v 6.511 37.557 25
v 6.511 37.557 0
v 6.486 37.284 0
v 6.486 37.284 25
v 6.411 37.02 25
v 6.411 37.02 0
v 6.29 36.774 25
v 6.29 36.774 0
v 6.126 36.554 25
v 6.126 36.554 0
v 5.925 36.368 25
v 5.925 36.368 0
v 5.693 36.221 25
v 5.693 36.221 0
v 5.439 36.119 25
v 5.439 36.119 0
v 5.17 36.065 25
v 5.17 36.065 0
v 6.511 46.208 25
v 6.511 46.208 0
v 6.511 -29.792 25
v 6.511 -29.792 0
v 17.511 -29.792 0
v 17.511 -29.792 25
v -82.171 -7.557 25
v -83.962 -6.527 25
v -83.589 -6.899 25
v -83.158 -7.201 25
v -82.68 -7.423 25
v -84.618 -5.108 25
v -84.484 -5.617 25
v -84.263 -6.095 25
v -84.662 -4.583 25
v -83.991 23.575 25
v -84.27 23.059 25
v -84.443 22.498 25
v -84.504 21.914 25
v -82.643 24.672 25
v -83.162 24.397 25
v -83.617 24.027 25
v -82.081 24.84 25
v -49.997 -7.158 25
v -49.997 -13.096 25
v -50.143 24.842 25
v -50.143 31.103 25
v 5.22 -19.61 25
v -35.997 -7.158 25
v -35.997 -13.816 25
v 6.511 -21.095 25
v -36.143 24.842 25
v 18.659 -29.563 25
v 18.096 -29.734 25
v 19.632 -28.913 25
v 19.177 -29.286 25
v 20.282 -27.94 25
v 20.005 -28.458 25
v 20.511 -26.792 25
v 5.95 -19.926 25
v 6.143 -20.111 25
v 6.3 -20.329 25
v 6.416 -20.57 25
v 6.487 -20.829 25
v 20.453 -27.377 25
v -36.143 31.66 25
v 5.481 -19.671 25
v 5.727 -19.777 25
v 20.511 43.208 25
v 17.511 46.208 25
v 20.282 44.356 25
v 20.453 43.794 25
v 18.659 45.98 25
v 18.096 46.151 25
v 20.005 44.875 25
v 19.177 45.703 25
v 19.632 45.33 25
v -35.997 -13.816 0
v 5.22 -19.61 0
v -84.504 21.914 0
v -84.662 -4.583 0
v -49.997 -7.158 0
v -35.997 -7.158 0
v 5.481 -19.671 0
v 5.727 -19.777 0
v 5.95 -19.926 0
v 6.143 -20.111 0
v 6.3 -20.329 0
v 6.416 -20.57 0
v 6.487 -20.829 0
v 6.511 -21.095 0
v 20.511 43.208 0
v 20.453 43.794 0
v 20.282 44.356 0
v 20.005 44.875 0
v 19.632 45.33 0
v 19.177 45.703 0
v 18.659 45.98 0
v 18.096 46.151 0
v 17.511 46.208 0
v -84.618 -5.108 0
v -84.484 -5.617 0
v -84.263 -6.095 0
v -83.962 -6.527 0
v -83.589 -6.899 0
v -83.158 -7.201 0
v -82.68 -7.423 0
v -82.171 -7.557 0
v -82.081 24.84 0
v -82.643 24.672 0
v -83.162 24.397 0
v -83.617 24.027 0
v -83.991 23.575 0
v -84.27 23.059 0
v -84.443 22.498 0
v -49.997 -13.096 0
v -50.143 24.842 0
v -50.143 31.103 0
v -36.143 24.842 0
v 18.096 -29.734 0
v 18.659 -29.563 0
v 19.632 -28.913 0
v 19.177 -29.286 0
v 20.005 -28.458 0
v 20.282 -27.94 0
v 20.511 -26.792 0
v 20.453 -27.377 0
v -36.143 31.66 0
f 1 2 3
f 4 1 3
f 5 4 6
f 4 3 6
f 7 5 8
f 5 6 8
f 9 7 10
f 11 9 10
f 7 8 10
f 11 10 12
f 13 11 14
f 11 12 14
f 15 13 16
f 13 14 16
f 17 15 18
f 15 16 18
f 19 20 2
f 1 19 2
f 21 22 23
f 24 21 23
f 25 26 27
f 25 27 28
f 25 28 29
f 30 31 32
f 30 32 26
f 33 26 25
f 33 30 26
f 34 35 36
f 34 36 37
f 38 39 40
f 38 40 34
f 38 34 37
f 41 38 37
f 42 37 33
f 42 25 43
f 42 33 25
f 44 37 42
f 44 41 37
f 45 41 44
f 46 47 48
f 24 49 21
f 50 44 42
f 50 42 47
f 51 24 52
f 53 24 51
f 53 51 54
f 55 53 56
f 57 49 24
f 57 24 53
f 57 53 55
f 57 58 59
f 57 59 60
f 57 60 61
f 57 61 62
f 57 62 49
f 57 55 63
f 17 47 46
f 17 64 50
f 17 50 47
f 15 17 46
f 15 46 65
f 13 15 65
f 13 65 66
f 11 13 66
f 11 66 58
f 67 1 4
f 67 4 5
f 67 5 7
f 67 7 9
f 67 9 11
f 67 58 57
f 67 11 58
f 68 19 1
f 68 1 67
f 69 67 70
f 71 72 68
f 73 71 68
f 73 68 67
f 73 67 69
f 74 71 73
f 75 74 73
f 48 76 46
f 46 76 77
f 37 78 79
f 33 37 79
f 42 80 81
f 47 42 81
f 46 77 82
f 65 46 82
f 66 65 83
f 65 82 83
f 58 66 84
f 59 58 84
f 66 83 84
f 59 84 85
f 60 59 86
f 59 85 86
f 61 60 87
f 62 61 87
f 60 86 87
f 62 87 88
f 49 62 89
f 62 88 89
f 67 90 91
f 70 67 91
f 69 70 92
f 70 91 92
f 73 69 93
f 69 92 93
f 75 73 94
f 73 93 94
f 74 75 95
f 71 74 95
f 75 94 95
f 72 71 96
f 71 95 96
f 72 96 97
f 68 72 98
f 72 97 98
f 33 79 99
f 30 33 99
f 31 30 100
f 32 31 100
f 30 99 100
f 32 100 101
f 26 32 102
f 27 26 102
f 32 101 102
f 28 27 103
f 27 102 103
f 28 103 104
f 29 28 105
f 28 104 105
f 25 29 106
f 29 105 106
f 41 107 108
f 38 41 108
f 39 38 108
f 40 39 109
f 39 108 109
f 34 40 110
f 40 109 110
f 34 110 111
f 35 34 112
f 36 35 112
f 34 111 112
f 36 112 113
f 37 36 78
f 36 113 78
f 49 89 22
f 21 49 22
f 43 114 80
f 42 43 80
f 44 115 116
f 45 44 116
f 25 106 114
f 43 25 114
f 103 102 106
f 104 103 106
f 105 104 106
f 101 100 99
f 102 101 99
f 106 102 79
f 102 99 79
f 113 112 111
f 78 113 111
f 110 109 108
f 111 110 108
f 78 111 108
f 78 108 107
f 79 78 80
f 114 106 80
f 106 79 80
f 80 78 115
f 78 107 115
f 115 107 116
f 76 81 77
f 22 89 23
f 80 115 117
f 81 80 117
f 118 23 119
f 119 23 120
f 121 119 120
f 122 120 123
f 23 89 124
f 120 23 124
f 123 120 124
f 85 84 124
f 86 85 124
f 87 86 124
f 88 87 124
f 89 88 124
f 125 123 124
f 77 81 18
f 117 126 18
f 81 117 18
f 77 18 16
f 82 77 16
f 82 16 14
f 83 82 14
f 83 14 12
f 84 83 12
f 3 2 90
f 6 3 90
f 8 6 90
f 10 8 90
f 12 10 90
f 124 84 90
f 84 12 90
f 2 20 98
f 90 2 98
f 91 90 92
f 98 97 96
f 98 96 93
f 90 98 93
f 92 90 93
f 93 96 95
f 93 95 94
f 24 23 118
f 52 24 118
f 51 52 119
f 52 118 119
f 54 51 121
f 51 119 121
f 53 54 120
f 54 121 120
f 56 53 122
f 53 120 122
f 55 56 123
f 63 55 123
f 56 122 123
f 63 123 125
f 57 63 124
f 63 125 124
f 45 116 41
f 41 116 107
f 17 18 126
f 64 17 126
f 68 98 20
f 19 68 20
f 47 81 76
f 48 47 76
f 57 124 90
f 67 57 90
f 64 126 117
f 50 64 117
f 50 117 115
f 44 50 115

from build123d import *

# Parameters (mm, degrees)
F1_DEPTH = 25
F2_DEPTH = 25


with BuildPart() as f1:
    # F0 (on Top) → F1 (new body)
    with BuildSketch(Plane.XY):
        with BuildLine():
            Line((20.510751, -26.791588), (20.510751, 43.208412))
            ThreePointArc((20.510751, 43.208412), (19.632072, 45.329732), (17.510751, 46.208412))
            Line((17.510751, 46.208412), (6.510751, 46.208412))
            Line((6.510751, 46.208412), (6.510751, 37.556949))
            ThreePointArc((6.510751, 37.556949), (6.126233, 36.554103), (5.169818, 36.065407))
            Line((5.169818, 36.065407), (-36.143343, 31.65953))
            Line((-36.143343, 31.65953), (-36.143343, 24.842082))
            Line((-36.143343, 24.842082), (-50.143343, 24.842082))
            Line((-50.143343, 24.842082), (-50.143343, 31.103174))
            Line((-50.143343, 31.103174), (-82.081185, 24.840478))
            ThreePointArc((-82.081185, 24.840478), (-83.814669, 23.809757), (-84.503856, 21.914401))
            Line((-84.503856, 21.914401), (-84.661583, -4.582726))
            ThreePointArc((-84.661583, -4.582726), (-83.961607, -6.526754), (-82.170625, -7.55709))
            Line((-82.170625, -7.55709), (-49.996673, -13.096121))
            Line((-49.996673, -13.096121), (-49.996673, -7.157918))
            Line((-49.996673, -7.157918), (-35.996673, -7.157918))
            Line((-35.996673, -7.157918), (-35.996673, -13.816103))
            Line((-35.996673, -13.816103), (5.219561, -19.610079))
            ThreePointArc((5.219561, -19.610079), (6.142832, -20.111405), (6.510751, -21.095474))
            Line((6.510751, -21.095474), (6.510751, -29.791588))
            Line((6.510751, -29.791588), (17.510751, -29.791588))
            ThreePointArc((17.510751, -29.791588), (19.632072, -28.912909), (20.510751, -26.791588))
        make_face()
    extrude(amount=F1_DEPTH)

    # F0 (on Top) → F2 (join)
    with BuildSketch(Plane.XY):
        with BuildLine():
            Line((20.510751, -26.791588), (20.510751, 43.208412))
            ThreePointArc((20.510751, 43.208412), (19.632072, 45.329732), (17.510751, 46.208412))
            Line((17.510751, 46.208412), (6.510751, 46.208412))
            Line((6.510751, 46.208412), (6.510751, 37.556949))
            ThreePointArc((6.510751, 37.556949), (6.126233, 36.554103), (5.169818, 36.065407))
            Line((5.169818, 36.065407), (-36.143343, 31.65953))
            Line((-36.143343, 31.65953), (-36.143343, 24.842082))
            Line((-36.143343, 24.842082), (-50.143343, 24.842082))
            Line((-50.143343, 24.842082), (-50.143343, 31.103174))
            Line((-50.143343, 31.103174), (-82.081185, 24.840478))
            ThreePointArc((-82.081185, 24.840478), (-83.814669, 23.809757), (-84.503856, 21.914401))
            Line((-84.503856, 21.914401), (-84.661583, -4.582726))
            ThreePointArc((-84.661583, -4.582726), (-83.961607, -6.526754), (-82.170625, -7.55709))
            Line((-82.170625, -7.55709), (-49.996673, -13.096121))
            Line((-49.996673, -13.096121), (-49.996673, -7.157918))
            Line((-49.996673, -7.157918), (-35.996673, -7.157918))
            Line((-35.996673, -7.157918), (-35.996673, -13.816103))
            Line((-35.996673, -13.816103), (5.219561, -19.610079))
            ThreePointArc((5.219561, -19.610079), (6.142832, -20.111405), (6.510751, -21.095474))
            Line((6.510751, -21.095474), (6.510751, -29.791588))
            Line((6.510751, -29.791588), (17.510751, -29.791588))
            ThreePointArc((17.510751, -29.791588), (19.632072, -28.912909), (20.510751, -26.791588))
        make_face()
    extrude(amount=F2_DEPTH)


solid = f1.part
